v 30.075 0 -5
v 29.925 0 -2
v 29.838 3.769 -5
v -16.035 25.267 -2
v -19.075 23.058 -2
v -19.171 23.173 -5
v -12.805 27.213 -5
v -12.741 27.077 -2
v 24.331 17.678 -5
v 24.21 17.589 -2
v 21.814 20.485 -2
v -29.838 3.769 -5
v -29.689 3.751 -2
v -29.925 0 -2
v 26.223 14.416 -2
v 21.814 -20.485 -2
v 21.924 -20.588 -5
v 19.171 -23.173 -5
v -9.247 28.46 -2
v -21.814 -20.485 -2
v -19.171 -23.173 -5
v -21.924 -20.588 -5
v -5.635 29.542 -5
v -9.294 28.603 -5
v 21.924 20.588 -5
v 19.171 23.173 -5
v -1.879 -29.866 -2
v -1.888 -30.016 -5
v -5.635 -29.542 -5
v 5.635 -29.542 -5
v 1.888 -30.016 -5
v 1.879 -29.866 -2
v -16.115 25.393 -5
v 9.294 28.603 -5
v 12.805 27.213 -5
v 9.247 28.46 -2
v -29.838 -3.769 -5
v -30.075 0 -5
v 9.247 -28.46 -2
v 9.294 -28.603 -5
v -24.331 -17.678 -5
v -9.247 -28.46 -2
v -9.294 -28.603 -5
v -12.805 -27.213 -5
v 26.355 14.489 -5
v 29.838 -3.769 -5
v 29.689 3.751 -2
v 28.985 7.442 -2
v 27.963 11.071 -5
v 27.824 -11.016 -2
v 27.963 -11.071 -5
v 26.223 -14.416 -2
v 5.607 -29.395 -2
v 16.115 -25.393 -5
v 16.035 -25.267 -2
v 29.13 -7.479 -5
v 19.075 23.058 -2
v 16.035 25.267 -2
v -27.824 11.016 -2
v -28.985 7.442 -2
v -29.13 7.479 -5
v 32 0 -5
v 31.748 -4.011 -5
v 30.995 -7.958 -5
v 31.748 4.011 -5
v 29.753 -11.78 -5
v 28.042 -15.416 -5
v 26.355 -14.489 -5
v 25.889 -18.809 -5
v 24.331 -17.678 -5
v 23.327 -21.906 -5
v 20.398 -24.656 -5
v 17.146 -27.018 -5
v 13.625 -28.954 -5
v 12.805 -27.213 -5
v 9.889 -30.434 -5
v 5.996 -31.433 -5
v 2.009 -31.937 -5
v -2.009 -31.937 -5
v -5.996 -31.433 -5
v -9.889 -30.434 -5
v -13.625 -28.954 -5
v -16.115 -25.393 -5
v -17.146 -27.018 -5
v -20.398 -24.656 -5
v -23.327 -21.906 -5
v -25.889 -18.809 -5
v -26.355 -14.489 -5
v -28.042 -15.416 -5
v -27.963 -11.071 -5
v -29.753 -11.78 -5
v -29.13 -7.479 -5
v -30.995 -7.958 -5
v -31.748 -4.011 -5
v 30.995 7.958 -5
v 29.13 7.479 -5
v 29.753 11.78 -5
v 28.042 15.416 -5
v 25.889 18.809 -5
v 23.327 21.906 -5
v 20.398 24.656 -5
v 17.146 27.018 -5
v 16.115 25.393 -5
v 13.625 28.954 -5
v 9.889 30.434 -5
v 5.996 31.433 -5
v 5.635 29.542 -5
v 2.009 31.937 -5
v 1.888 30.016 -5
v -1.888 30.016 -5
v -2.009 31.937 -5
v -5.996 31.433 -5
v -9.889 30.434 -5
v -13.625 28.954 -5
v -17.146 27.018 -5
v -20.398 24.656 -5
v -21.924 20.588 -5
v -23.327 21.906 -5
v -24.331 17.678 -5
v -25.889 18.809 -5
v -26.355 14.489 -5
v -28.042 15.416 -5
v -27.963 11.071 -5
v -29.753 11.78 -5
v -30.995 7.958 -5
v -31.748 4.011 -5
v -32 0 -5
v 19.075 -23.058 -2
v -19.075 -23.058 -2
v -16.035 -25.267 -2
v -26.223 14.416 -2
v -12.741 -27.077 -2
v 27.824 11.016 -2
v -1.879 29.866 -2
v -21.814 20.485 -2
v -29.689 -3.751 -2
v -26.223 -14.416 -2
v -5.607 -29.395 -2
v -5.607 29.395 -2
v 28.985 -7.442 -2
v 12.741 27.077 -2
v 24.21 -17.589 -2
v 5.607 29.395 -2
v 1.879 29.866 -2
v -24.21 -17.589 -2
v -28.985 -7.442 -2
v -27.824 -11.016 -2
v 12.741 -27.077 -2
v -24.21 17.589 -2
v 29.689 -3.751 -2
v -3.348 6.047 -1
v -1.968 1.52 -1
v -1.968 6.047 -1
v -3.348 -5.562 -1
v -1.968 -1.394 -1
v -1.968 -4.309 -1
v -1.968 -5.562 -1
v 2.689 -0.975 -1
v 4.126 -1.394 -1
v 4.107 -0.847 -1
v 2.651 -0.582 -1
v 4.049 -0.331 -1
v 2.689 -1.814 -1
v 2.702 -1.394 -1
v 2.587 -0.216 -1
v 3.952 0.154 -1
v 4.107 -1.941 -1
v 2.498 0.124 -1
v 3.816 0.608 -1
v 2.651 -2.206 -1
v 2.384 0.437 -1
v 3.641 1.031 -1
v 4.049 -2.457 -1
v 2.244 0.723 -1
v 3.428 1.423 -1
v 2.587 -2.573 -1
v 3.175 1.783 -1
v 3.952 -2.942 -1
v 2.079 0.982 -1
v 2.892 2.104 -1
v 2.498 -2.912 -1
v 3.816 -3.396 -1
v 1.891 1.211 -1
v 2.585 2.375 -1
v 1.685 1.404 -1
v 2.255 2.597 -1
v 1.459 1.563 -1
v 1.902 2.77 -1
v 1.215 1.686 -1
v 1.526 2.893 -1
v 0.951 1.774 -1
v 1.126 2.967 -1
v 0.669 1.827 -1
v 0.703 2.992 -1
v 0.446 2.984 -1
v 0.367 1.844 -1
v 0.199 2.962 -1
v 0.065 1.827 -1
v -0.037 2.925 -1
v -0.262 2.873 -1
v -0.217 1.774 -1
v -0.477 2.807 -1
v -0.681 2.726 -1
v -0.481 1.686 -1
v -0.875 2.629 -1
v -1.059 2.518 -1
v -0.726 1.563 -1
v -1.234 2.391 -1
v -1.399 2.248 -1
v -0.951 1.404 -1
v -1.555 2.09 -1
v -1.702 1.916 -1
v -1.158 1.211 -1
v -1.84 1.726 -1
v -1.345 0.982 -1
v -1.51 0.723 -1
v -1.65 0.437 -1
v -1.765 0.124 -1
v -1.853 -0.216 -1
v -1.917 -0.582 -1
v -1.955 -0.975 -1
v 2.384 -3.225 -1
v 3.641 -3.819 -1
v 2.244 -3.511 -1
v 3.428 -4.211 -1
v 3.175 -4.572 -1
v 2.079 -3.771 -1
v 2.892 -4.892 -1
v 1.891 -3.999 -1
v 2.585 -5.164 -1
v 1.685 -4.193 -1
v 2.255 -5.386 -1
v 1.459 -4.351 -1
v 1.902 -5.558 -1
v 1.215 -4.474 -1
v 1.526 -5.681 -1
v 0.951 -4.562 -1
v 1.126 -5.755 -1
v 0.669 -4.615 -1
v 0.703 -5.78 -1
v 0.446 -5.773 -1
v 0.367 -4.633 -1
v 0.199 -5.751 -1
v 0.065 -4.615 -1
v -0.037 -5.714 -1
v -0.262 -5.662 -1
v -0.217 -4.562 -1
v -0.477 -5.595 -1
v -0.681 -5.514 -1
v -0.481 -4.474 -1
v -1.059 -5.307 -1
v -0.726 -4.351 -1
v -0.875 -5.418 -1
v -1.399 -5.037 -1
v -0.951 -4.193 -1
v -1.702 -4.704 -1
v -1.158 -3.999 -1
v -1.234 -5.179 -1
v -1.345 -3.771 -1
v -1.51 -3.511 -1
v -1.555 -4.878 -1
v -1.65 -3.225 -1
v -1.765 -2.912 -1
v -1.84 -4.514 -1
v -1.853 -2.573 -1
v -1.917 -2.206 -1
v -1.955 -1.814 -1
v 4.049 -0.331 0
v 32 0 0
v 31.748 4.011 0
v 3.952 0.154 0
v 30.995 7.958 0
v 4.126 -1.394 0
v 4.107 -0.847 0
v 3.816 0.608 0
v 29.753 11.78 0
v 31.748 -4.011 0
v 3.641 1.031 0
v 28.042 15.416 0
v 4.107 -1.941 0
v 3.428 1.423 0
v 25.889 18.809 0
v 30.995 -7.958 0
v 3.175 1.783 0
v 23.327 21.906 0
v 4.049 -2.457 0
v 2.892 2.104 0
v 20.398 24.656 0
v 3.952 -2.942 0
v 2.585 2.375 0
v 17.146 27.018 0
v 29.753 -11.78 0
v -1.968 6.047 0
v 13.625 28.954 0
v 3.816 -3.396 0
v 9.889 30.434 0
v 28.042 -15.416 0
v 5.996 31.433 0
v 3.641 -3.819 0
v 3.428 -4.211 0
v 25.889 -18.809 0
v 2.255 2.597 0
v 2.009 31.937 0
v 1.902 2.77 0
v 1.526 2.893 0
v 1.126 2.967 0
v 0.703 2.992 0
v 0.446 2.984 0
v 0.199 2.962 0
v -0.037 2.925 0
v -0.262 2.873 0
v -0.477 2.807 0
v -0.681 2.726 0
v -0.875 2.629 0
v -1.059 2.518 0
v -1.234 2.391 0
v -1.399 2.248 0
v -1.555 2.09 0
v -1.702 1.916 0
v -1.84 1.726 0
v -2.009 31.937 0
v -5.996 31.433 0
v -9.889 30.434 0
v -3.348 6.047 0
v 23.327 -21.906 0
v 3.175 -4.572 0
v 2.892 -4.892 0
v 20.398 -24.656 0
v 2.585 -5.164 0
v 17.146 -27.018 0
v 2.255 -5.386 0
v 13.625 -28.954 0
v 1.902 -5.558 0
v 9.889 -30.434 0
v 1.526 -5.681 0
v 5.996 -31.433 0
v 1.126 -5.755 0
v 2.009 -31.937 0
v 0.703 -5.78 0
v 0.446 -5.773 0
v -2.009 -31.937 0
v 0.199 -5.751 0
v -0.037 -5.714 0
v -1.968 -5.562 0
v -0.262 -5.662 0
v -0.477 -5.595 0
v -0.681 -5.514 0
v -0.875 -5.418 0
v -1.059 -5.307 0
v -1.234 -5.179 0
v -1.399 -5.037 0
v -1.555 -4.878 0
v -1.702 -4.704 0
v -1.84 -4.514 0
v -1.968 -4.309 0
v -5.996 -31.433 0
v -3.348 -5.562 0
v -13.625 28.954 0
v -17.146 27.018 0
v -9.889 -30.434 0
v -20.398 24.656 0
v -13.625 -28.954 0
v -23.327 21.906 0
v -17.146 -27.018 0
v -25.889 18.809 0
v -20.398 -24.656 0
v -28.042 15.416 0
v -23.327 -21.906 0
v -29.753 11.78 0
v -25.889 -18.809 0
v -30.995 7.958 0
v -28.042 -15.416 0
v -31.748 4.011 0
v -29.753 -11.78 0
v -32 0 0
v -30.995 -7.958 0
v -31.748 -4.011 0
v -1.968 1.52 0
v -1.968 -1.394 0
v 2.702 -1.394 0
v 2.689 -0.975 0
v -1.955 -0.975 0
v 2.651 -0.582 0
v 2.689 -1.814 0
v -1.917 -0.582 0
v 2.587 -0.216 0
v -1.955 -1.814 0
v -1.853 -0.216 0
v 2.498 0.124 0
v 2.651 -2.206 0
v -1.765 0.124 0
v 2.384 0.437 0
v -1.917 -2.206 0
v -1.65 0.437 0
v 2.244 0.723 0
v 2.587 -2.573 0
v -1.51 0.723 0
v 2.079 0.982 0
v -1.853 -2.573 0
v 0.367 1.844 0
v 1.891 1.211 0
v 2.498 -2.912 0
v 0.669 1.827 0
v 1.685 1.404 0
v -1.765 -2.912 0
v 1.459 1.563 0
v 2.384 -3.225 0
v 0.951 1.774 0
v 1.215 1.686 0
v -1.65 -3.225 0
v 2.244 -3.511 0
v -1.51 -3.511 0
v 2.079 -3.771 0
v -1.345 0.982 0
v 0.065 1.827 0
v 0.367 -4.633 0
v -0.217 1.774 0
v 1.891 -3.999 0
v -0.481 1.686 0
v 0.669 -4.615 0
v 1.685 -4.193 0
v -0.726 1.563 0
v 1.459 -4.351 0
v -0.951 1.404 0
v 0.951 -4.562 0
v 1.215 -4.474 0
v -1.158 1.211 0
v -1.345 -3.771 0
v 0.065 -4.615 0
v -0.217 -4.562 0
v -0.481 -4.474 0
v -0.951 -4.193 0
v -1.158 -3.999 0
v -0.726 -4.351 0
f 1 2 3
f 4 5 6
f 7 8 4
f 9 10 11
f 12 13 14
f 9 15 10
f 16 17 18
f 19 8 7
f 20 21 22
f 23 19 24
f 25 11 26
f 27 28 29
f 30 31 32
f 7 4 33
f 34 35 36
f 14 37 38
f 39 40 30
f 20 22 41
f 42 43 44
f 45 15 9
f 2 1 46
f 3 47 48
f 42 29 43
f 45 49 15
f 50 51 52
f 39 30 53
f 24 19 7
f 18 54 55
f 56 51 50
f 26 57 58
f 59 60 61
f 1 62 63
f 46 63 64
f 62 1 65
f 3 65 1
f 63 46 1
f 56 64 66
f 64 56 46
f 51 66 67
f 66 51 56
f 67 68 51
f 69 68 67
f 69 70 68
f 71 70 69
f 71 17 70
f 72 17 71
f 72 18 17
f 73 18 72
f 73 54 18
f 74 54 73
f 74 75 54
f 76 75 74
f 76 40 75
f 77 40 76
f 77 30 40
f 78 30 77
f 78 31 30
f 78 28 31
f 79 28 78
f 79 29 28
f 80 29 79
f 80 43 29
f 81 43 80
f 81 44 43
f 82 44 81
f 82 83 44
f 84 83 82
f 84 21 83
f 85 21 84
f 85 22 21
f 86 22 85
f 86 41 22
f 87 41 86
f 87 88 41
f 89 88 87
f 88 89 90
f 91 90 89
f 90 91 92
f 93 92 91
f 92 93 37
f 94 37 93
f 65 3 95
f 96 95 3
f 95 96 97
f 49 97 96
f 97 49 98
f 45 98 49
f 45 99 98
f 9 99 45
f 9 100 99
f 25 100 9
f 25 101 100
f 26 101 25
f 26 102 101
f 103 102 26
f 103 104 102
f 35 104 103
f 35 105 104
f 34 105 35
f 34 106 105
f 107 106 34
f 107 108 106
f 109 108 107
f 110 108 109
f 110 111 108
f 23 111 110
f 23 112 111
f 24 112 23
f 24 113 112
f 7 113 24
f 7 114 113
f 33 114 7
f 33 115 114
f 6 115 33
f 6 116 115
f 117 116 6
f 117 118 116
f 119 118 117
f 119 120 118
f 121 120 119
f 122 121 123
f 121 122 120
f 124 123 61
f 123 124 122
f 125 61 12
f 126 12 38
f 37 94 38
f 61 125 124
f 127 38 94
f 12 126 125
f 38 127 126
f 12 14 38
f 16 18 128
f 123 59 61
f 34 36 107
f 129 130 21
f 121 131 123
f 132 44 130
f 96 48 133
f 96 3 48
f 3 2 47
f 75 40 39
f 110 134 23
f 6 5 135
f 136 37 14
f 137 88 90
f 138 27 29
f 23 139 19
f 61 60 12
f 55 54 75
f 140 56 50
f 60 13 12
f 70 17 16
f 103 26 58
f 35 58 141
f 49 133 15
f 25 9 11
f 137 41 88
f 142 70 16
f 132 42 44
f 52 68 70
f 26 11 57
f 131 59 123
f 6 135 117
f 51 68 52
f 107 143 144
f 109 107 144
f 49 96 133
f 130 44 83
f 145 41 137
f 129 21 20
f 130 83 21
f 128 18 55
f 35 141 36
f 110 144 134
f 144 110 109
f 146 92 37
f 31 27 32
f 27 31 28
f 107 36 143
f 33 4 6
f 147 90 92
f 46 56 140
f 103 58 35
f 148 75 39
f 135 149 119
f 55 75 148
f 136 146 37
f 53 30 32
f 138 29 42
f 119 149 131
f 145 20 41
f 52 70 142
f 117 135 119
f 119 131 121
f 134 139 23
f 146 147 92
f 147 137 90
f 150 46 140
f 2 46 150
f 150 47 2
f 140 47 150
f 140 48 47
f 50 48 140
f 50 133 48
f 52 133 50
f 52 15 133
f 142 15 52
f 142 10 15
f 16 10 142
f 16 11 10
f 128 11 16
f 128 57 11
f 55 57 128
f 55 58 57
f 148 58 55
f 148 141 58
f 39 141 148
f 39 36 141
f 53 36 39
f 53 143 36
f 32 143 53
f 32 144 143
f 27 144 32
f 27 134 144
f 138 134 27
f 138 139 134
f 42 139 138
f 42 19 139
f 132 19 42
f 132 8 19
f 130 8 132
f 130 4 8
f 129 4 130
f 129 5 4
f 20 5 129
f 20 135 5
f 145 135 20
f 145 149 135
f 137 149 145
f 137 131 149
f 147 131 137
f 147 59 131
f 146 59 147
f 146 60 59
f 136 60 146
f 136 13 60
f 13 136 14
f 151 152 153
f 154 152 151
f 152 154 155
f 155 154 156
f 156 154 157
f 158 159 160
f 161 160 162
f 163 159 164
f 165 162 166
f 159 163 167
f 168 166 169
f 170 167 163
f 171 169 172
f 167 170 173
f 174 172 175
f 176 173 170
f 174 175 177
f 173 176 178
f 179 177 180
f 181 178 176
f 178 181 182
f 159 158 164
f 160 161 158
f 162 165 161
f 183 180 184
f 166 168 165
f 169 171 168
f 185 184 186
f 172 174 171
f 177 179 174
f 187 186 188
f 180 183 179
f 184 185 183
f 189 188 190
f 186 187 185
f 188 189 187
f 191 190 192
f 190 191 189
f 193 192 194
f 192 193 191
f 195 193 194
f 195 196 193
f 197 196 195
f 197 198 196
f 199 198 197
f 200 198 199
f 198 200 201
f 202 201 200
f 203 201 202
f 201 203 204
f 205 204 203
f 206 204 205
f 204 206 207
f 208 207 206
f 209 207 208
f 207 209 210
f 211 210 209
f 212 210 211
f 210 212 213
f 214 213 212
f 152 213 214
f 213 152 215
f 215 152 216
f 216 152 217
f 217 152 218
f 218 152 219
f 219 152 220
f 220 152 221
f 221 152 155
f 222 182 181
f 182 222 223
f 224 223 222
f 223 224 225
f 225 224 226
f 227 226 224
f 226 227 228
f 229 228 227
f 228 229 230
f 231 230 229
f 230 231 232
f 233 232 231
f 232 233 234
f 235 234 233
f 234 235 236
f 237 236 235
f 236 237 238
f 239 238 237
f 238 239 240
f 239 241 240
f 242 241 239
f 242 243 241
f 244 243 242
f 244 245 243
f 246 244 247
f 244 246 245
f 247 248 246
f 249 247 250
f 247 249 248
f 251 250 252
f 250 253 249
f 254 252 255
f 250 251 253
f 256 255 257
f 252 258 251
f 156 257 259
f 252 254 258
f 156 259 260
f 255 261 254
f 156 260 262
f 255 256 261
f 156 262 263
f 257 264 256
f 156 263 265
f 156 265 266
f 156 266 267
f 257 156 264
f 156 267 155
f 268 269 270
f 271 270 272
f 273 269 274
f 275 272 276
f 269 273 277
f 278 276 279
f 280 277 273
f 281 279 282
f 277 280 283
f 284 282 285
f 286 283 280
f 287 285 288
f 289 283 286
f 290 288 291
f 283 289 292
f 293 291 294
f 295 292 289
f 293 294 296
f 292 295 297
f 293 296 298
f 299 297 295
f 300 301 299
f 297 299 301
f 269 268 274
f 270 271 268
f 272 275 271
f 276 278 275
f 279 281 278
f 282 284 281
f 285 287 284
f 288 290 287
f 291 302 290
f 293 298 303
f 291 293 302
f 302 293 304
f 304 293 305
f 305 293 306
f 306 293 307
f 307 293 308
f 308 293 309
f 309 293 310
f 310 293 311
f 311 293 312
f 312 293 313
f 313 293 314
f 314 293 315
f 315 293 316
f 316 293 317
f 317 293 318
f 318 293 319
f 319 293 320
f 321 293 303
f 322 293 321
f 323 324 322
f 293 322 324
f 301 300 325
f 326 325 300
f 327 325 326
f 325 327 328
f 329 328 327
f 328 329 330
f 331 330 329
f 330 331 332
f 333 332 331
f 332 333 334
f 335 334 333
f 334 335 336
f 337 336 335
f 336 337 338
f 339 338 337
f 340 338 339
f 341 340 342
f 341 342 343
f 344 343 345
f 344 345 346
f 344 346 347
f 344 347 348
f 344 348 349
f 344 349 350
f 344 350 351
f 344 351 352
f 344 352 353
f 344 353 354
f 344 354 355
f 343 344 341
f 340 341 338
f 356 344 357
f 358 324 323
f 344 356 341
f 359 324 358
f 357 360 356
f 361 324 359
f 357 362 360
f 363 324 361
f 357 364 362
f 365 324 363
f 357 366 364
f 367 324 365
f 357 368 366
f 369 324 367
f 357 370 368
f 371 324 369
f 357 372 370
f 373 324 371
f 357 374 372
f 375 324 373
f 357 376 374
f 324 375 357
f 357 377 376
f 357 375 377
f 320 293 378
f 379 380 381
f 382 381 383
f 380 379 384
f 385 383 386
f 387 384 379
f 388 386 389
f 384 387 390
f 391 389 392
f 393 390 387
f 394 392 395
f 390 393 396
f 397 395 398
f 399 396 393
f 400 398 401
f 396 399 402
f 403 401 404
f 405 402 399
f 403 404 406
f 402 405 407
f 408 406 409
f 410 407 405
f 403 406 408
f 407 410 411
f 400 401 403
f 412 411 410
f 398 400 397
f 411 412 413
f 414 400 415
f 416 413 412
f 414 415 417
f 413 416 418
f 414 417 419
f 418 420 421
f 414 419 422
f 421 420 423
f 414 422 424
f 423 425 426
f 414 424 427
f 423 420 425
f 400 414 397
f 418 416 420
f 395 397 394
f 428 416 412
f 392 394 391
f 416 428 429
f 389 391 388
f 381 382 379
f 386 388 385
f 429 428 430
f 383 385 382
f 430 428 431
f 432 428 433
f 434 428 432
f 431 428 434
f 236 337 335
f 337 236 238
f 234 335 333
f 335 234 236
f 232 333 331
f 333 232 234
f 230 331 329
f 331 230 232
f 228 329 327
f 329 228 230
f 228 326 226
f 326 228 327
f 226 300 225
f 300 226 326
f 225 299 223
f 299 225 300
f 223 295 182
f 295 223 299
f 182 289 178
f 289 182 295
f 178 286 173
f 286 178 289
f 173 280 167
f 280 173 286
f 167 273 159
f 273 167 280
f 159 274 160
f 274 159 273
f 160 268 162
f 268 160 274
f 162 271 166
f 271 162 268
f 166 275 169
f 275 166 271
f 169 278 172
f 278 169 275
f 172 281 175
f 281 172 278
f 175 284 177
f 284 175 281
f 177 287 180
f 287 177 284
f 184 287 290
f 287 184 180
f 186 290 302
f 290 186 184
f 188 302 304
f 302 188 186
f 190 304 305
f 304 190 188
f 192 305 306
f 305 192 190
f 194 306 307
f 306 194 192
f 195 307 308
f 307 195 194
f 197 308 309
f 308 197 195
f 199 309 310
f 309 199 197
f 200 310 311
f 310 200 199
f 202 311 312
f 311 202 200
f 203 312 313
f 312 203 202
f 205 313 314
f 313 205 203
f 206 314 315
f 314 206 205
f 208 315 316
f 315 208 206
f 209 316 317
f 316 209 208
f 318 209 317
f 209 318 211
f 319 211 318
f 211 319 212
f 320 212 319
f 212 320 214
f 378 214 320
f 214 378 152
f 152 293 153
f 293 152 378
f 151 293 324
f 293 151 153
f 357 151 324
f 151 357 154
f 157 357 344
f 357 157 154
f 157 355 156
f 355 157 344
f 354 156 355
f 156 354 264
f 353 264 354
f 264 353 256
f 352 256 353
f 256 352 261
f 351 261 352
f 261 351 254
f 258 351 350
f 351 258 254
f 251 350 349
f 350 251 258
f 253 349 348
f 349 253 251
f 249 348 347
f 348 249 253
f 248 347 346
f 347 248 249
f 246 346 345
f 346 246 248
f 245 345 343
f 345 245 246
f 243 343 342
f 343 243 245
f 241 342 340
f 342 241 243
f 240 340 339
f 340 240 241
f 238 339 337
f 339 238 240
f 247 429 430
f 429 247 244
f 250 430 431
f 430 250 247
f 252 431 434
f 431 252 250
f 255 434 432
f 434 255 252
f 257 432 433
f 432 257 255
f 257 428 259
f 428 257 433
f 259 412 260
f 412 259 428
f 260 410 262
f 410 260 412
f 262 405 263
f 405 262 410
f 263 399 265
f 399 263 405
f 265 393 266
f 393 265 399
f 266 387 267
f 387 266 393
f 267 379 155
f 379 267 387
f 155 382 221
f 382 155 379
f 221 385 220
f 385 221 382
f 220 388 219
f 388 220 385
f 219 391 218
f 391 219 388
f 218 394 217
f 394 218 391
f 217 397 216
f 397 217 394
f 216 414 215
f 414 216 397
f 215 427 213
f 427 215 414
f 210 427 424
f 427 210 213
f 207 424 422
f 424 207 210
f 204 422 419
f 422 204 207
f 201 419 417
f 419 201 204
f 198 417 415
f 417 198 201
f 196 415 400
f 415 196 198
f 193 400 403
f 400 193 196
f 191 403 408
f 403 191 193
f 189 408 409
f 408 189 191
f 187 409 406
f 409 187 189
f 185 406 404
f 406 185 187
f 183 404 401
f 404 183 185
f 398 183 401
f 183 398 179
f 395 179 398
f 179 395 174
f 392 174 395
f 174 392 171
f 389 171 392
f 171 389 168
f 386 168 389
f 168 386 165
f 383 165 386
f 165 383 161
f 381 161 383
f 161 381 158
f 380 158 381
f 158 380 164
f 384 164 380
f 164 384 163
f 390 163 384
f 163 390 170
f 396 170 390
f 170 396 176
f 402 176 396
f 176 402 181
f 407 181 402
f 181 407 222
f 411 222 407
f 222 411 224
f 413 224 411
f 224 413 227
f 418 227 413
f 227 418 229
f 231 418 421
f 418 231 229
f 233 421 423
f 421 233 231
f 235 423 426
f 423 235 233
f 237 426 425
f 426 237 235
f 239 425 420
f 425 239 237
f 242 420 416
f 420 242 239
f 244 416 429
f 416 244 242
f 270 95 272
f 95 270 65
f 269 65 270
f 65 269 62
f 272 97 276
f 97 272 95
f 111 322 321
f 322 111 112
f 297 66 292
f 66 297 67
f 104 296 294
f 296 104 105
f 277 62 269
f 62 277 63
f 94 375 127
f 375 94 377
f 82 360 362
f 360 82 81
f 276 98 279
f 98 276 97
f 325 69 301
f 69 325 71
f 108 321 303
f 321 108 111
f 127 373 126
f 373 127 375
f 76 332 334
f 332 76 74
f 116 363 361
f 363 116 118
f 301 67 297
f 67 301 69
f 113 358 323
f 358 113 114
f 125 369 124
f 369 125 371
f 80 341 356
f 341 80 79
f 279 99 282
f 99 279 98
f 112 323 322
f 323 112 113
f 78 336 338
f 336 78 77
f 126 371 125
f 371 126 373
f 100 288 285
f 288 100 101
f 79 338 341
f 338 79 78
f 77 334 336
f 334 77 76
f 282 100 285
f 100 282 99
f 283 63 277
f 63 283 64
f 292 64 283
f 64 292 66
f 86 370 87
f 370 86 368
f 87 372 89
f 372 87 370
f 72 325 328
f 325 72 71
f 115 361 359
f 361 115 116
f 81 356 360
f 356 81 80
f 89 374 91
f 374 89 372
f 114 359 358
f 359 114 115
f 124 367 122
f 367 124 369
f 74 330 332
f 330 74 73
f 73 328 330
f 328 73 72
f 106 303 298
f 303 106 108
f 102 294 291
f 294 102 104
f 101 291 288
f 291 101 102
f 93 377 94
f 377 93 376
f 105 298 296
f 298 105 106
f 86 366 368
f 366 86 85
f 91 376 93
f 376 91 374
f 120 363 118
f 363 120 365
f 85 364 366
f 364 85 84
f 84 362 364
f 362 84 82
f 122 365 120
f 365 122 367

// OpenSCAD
$fn = 50;

difference() {
	union() {
		translate(v = [0, 0, -5.0]) {
			cylinder(h = 5, r = 32.0);
		}
	}
	union() {
		#translate(v = [0, 0, -5.0]) {
			cylinder(h = 3, r1 = 30.075, r2 = 29.925);
		}
		translate(v = [0, 0, -1]) {
			linear_extrude(height = 1) {
				text(font = "Webdings", halign = "center", size = 11, text = "b", valign = "center");
			}
		}
	}
}
